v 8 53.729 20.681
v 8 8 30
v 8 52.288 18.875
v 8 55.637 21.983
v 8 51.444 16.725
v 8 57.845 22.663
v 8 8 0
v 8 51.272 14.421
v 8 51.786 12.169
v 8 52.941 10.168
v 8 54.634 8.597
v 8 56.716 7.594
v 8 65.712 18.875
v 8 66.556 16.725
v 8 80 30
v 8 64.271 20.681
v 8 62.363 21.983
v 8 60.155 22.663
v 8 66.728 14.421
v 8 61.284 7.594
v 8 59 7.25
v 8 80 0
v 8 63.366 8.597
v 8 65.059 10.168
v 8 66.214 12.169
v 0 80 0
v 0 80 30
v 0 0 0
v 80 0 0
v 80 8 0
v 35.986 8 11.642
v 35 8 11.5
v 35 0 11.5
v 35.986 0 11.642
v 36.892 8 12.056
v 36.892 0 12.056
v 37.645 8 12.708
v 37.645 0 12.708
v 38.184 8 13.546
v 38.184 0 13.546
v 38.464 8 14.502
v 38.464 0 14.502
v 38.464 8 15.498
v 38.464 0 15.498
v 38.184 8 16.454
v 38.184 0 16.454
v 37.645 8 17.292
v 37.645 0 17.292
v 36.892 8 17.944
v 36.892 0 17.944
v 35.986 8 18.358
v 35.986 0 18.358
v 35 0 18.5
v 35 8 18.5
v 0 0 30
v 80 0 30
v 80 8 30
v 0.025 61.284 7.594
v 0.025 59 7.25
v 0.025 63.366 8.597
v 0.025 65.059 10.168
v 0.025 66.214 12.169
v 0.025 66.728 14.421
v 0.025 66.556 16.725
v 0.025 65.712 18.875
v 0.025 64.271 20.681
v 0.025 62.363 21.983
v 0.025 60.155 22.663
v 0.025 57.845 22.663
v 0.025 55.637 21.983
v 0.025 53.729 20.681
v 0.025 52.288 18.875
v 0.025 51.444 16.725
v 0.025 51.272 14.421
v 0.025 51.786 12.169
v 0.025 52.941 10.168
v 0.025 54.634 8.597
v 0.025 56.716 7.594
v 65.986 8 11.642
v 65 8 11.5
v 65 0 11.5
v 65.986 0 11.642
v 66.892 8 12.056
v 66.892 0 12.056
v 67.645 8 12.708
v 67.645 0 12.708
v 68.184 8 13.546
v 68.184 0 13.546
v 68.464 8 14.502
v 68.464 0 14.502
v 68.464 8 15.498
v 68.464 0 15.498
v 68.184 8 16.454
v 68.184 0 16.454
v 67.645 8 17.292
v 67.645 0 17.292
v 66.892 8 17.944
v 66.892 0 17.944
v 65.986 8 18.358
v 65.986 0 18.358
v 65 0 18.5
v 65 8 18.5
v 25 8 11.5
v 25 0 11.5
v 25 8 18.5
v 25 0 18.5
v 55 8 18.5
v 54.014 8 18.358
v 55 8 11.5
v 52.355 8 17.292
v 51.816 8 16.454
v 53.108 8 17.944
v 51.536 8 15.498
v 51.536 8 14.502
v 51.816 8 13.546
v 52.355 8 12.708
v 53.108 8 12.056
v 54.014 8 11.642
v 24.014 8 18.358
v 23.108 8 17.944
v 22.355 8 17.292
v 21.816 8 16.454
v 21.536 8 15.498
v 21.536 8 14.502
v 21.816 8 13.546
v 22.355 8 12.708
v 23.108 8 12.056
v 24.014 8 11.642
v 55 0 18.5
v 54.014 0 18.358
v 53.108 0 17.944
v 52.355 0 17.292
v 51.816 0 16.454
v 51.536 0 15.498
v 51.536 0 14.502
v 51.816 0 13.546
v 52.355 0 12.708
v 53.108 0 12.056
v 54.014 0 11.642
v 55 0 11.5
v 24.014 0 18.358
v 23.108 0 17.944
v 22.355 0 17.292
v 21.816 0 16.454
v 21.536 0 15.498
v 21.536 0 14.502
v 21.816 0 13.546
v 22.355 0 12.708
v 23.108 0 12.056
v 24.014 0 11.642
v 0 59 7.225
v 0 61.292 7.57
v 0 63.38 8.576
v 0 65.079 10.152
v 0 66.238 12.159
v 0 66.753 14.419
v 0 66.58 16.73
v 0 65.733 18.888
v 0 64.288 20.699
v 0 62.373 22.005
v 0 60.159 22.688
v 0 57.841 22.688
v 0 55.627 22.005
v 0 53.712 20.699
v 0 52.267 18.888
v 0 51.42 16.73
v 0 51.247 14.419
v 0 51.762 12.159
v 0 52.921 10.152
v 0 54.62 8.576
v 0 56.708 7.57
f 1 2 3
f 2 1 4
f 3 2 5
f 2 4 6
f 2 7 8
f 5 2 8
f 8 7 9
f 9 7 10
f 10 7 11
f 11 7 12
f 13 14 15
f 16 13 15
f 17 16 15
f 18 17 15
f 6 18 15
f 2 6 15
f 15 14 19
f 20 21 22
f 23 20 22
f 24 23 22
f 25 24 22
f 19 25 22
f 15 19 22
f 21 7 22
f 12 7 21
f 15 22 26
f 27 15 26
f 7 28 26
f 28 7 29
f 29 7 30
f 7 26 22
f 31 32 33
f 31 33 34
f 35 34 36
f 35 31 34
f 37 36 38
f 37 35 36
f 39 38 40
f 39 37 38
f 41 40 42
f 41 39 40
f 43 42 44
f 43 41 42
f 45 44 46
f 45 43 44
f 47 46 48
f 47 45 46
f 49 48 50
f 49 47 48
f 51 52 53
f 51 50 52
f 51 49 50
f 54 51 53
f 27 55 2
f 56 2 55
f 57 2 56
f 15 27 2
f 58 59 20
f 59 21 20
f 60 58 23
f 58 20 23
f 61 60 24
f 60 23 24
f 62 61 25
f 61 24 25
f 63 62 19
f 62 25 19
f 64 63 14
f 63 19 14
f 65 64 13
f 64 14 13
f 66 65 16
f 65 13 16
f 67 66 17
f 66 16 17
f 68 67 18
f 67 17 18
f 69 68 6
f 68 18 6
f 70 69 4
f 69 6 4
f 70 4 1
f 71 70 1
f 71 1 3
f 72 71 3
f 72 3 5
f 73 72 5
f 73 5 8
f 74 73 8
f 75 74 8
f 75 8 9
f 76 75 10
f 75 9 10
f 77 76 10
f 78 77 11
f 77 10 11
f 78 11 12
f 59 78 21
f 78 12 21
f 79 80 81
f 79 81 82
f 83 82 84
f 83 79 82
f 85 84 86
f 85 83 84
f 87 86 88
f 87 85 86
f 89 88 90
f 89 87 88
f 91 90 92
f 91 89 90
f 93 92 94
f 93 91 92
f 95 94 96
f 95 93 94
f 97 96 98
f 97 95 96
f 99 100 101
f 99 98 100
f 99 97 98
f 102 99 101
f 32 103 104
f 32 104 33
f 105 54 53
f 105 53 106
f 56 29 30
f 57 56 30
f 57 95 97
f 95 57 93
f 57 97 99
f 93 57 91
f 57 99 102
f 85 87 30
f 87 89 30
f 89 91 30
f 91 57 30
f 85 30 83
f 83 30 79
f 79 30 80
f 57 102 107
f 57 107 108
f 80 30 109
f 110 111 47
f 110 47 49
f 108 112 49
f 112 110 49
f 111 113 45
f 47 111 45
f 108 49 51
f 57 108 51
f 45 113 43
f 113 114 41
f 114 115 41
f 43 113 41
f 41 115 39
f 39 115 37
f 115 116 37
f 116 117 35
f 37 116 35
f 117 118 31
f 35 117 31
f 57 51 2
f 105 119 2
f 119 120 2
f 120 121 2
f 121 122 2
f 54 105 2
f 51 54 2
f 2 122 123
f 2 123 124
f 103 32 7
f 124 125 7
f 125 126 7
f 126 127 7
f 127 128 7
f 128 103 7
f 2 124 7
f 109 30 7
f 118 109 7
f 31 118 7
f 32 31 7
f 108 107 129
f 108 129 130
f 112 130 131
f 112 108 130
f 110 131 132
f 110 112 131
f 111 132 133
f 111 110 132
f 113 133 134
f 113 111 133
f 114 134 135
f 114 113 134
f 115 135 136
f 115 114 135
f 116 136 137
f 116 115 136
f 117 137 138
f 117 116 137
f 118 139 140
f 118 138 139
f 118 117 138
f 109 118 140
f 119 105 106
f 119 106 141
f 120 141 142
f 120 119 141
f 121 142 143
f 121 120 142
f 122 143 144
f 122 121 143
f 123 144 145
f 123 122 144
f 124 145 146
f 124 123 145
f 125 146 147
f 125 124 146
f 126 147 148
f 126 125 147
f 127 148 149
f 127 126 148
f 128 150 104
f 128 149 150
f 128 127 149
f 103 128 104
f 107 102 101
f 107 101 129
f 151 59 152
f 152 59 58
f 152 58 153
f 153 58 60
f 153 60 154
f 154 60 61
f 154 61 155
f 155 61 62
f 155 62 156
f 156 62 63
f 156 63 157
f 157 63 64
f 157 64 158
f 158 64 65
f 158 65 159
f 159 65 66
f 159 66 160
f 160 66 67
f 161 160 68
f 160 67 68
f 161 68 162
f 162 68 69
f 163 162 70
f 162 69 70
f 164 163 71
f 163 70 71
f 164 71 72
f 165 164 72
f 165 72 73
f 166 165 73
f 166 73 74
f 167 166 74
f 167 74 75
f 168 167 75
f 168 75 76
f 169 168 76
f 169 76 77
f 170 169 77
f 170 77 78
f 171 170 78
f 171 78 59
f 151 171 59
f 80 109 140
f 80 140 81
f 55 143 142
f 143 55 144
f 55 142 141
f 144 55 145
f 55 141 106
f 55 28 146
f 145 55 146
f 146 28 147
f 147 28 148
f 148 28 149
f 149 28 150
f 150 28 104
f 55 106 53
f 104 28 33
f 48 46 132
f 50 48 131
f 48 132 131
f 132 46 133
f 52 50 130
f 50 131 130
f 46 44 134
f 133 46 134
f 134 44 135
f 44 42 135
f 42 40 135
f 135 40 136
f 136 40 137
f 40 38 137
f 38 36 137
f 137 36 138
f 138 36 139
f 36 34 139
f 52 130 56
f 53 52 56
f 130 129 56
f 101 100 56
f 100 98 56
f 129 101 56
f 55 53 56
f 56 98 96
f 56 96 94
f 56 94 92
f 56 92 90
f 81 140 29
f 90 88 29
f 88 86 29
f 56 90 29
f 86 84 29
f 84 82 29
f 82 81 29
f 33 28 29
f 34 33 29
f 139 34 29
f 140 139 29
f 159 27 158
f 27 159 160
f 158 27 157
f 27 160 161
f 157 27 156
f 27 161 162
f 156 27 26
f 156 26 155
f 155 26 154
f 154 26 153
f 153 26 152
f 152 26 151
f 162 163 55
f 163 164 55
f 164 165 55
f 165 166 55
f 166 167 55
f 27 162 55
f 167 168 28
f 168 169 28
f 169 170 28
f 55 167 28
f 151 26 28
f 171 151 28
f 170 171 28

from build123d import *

# Parameters (mm, degrees)
EXTRUDE_1_DEPTH                     = 30
CUT_EXTRUDE_1_DEPTH                 = 60
HOLE_WIZARD_15_5_15_5_1_D           = 15.5
HOLE_WIZARD_15_5_15_5_1_DEPTH       = 17
HOLE_WIZARD_15_5_15_5_1_CSINK_D     = 15.55
HOLE_WIZARD_15_5_15_5_1_CSINK_ANGLE = 90
HOLE_WIZARD_15_5_15_5_1_TIP         = 4.656669797


with BuildPart() as part:
    # 草图1 → 凸台-拉伸1 (new body)
    with BuildSketch(Plane.XY):
        Polygon((0, 80), (0, 0), (80, 0), (80, 8), (8, 8), (8, 80), align=None)
    extrude(amount=EXTRUDE_1_DEPTH)

    # 草图2 → 切除-拉伸1 (cut)
    with BuildSketch(Plane(origin=(0, 8, 0), x_dir=(1, 0, 0), z_dir=(0, 1, 0))):
        with BuildLine():
            Line((55, -11.5), (65, -11.5))
            ThreePointArc((65, -11.5), (68.5, -15), (65, -18.5))
            Line((65, -18.5), (55, -18.5))
            ThreePointArc((55, -18.5), (51.5, -15), (55, -11.5))
        make_face()
        with BuildLine():
            Line((25, -11.5), (35, -11.5))
            ThreePointArc((35, -11.5), (38.5, -15), (35, -18.5))
            Line((35, -18.5), (25, -18.5))
            ThreePointArc((25, -18.5), (21.5, -15), (25, -11.5))
        make_face()
    extrude(amount=-CUT_EXTRUDE_1_DEPTH, mode=Mode.SUBTRACT)

    # Ø15.5 (15.5) 直径槽口1
    with Locations(Plane.ZY):
        with Locations((15, 59)):
            CounterSinkHole(HOLE_WIZARD_15_5_15_5_1_D / 2, HOLE_WIZARD_15_5_15_5_1_CSINK_D / 2, depth=HOLE_WIZARD_15_5_15_5_1_DEPTH, counter_sink_angle=HOLE_WIZARD_15_5_15_5_1_CSINK_ANGLE)
            with Locations((0, 0, -(HOLE_WIZARD_15_5_15_5_1_DEPTH + HOLE_WIZARD_15_5_15_5_1_TIP / 2))):  # 118° drill point
                Cone(0, HOLE_WIZARD_15_5_15_5_1_D / 2, HOLE_WIZARD_15_5_15_5_1_TIP, mode=Mode.SUBTRACT)


solid = part.part
